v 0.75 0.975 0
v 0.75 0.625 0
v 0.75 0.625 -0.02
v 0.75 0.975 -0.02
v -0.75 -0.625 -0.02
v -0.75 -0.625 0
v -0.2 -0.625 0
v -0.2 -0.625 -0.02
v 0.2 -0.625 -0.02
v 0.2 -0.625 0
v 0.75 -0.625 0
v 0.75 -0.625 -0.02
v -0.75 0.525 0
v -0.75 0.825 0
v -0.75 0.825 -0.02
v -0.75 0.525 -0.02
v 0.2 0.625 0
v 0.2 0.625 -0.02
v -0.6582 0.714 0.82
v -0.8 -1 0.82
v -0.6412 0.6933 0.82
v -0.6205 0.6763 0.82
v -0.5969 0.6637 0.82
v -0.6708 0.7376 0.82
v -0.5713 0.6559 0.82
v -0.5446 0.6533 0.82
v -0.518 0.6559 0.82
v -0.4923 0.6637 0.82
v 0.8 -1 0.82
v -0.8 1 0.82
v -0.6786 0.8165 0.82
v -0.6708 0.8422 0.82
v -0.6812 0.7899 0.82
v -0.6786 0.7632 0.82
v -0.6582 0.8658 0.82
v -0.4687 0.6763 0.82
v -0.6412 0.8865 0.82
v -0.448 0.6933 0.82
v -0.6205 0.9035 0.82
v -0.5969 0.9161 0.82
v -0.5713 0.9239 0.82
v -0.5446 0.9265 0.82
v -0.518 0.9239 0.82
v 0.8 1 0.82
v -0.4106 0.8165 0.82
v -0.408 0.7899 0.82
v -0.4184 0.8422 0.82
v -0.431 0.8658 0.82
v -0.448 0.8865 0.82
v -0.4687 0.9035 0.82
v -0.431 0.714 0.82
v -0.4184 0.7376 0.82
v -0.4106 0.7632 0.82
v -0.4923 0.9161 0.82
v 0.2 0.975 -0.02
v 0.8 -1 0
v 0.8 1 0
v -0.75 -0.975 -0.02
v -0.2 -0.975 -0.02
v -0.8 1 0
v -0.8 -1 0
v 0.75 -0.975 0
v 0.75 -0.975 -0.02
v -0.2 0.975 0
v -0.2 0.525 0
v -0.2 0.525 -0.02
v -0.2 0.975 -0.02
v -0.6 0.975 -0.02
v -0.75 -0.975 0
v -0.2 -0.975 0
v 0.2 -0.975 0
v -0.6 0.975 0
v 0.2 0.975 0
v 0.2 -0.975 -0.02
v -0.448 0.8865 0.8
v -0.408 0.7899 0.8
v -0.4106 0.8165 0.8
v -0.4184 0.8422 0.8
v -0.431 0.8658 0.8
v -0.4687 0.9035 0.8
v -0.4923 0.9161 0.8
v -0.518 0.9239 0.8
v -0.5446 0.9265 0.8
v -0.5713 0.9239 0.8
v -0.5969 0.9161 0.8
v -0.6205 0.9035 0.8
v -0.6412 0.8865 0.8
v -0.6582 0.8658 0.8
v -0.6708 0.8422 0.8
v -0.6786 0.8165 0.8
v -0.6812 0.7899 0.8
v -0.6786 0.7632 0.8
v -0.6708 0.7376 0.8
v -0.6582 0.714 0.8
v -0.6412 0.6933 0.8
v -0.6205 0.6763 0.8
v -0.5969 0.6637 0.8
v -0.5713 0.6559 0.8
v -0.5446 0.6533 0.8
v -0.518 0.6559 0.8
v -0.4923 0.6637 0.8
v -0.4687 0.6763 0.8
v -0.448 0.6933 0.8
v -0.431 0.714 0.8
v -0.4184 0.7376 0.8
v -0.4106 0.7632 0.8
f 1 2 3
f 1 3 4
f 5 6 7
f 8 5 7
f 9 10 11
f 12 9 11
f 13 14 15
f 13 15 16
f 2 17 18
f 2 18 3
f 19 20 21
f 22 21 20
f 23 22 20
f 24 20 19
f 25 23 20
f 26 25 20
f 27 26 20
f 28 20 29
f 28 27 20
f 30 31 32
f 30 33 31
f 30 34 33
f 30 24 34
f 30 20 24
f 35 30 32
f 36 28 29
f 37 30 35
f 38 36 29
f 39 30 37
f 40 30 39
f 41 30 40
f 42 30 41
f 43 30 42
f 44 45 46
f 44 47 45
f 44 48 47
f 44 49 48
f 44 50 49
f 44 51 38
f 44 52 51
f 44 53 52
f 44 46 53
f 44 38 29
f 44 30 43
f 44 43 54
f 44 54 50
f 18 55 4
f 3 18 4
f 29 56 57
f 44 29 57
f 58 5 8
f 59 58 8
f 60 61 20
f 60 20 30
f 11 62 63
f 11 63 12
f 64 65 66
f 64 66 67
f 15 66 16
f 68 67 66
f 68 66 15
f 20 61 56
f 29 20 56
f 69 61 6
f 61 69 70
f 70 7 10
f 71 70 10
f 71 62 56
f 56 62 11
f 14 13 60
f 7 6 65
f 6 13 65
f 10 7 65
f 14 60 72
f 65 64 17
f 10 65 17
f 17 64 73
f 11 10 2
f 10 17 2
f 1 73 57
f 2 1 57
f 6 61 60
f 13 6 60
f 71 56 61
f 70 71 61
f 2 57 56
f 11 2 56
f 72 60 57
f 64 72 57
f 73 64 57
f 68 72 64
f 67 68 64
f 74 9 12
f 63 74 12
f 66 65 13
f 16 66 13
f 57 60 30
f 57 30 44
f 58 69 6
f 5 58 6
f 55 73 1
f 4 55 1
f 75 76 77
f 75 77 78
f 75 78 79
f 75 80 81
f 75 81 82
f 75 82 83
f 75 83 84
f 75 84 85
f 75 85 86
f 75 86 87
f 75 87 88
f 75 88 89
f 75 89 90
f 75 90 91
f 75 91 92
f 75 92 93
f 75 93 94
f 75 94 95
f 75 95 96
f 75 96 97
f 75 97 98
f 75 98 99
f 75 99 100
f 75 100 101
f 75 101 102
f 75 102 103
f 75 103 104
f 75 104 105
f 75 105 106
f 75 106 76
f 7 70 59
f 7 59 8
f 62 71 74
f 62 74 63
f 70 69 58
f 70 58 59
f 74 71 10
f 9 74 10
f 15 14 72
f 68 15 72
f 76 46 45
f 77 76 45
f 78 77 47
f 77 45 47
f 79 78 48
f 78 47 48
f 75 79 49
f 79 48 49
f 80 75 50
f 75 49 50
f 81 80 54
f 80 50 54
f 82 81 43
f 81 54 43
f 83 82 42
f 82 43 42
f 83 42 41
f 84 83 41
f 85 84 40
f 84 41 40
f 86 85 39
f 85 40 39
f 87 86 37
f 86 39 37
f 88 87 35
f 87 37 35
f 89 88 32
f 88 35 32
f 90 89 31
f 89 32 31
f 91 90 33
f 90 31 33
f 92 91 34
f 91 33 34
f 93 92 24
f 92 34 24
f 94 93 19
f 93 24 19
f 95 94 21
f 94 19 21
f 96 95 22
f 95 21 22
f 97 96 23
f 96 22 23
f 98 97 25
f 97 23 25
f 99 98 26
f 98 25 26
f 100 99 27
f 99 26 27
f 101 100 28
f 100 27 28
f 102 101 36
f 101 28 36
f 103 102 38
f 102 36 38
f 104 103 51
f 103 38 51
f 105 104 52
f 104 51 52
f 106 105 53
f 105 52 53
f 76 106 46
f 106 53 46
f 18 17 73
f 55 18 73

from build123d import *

# Parameters (mm, degrees)
SKETCH1_W           = 1.6
SKETCH1_H           = 2
BOSS_EXTRUDE1_DEPTH = 0.82
SKETCH2_R           = 0.136611136
CUT_EXTRUDE1_DEPTH  = 0.02
BOSS_EXTRUDE2_START = -0.82
SKETCH3_W           = 0.55
SKETCH3_H           = 0.35
BOSS_EXTRUDE2_DEPTH = 0.02


with BuildPart() as part:
    # Sketch1 → Boss-Extrude1 (new body)
    with BuildSketch(Plane.XY):
        Rectangle(SKETCH1_W, SKETCH1_H)
    extrude(amount=BOSS_EXTRUDE1_DEPTH)

    # Sketch2 → Cut-Extrude1 (cut)
    with BuildSketch(Plane.XY.offset(0.82)):
        with Locations((-0.544602285, 0.78988591)):
            Circle(SKETCH2_R)
    extrude(amount=-CUT_EXTRUDE1_DEPTH, mode=Mode.SUBTRACT)

    # Sketch3 → Boss-Extrude2 (add)
    with BuildSketch(Plane.XY.offset(0.82).offset(BOSS_EXTRUDE2_START)):
        with Locations((0.475, 0.8)):
            Rectangle(SKETCH3_W, SKETCH3_H)
        Polygon((-0.75, 0.625), (-0.75, 0.825), (-0.6, 0.975), (-0.2, 0.975), (-0.2, 0.625), (-0.2, 0.525), (-0.75, 0.525), align=None)
        with Locations((-0.475, -0.8)):
            Rectangle(SKETCH3_W, SKETCH3_H)
        with Locations((0.475, -0.8)):
            Rectangle(SKETCH3_W, SKETCH3_H)
    extrude(amount=-BOSS_EXTRUDE2_DEPTH)


solid = part.part
